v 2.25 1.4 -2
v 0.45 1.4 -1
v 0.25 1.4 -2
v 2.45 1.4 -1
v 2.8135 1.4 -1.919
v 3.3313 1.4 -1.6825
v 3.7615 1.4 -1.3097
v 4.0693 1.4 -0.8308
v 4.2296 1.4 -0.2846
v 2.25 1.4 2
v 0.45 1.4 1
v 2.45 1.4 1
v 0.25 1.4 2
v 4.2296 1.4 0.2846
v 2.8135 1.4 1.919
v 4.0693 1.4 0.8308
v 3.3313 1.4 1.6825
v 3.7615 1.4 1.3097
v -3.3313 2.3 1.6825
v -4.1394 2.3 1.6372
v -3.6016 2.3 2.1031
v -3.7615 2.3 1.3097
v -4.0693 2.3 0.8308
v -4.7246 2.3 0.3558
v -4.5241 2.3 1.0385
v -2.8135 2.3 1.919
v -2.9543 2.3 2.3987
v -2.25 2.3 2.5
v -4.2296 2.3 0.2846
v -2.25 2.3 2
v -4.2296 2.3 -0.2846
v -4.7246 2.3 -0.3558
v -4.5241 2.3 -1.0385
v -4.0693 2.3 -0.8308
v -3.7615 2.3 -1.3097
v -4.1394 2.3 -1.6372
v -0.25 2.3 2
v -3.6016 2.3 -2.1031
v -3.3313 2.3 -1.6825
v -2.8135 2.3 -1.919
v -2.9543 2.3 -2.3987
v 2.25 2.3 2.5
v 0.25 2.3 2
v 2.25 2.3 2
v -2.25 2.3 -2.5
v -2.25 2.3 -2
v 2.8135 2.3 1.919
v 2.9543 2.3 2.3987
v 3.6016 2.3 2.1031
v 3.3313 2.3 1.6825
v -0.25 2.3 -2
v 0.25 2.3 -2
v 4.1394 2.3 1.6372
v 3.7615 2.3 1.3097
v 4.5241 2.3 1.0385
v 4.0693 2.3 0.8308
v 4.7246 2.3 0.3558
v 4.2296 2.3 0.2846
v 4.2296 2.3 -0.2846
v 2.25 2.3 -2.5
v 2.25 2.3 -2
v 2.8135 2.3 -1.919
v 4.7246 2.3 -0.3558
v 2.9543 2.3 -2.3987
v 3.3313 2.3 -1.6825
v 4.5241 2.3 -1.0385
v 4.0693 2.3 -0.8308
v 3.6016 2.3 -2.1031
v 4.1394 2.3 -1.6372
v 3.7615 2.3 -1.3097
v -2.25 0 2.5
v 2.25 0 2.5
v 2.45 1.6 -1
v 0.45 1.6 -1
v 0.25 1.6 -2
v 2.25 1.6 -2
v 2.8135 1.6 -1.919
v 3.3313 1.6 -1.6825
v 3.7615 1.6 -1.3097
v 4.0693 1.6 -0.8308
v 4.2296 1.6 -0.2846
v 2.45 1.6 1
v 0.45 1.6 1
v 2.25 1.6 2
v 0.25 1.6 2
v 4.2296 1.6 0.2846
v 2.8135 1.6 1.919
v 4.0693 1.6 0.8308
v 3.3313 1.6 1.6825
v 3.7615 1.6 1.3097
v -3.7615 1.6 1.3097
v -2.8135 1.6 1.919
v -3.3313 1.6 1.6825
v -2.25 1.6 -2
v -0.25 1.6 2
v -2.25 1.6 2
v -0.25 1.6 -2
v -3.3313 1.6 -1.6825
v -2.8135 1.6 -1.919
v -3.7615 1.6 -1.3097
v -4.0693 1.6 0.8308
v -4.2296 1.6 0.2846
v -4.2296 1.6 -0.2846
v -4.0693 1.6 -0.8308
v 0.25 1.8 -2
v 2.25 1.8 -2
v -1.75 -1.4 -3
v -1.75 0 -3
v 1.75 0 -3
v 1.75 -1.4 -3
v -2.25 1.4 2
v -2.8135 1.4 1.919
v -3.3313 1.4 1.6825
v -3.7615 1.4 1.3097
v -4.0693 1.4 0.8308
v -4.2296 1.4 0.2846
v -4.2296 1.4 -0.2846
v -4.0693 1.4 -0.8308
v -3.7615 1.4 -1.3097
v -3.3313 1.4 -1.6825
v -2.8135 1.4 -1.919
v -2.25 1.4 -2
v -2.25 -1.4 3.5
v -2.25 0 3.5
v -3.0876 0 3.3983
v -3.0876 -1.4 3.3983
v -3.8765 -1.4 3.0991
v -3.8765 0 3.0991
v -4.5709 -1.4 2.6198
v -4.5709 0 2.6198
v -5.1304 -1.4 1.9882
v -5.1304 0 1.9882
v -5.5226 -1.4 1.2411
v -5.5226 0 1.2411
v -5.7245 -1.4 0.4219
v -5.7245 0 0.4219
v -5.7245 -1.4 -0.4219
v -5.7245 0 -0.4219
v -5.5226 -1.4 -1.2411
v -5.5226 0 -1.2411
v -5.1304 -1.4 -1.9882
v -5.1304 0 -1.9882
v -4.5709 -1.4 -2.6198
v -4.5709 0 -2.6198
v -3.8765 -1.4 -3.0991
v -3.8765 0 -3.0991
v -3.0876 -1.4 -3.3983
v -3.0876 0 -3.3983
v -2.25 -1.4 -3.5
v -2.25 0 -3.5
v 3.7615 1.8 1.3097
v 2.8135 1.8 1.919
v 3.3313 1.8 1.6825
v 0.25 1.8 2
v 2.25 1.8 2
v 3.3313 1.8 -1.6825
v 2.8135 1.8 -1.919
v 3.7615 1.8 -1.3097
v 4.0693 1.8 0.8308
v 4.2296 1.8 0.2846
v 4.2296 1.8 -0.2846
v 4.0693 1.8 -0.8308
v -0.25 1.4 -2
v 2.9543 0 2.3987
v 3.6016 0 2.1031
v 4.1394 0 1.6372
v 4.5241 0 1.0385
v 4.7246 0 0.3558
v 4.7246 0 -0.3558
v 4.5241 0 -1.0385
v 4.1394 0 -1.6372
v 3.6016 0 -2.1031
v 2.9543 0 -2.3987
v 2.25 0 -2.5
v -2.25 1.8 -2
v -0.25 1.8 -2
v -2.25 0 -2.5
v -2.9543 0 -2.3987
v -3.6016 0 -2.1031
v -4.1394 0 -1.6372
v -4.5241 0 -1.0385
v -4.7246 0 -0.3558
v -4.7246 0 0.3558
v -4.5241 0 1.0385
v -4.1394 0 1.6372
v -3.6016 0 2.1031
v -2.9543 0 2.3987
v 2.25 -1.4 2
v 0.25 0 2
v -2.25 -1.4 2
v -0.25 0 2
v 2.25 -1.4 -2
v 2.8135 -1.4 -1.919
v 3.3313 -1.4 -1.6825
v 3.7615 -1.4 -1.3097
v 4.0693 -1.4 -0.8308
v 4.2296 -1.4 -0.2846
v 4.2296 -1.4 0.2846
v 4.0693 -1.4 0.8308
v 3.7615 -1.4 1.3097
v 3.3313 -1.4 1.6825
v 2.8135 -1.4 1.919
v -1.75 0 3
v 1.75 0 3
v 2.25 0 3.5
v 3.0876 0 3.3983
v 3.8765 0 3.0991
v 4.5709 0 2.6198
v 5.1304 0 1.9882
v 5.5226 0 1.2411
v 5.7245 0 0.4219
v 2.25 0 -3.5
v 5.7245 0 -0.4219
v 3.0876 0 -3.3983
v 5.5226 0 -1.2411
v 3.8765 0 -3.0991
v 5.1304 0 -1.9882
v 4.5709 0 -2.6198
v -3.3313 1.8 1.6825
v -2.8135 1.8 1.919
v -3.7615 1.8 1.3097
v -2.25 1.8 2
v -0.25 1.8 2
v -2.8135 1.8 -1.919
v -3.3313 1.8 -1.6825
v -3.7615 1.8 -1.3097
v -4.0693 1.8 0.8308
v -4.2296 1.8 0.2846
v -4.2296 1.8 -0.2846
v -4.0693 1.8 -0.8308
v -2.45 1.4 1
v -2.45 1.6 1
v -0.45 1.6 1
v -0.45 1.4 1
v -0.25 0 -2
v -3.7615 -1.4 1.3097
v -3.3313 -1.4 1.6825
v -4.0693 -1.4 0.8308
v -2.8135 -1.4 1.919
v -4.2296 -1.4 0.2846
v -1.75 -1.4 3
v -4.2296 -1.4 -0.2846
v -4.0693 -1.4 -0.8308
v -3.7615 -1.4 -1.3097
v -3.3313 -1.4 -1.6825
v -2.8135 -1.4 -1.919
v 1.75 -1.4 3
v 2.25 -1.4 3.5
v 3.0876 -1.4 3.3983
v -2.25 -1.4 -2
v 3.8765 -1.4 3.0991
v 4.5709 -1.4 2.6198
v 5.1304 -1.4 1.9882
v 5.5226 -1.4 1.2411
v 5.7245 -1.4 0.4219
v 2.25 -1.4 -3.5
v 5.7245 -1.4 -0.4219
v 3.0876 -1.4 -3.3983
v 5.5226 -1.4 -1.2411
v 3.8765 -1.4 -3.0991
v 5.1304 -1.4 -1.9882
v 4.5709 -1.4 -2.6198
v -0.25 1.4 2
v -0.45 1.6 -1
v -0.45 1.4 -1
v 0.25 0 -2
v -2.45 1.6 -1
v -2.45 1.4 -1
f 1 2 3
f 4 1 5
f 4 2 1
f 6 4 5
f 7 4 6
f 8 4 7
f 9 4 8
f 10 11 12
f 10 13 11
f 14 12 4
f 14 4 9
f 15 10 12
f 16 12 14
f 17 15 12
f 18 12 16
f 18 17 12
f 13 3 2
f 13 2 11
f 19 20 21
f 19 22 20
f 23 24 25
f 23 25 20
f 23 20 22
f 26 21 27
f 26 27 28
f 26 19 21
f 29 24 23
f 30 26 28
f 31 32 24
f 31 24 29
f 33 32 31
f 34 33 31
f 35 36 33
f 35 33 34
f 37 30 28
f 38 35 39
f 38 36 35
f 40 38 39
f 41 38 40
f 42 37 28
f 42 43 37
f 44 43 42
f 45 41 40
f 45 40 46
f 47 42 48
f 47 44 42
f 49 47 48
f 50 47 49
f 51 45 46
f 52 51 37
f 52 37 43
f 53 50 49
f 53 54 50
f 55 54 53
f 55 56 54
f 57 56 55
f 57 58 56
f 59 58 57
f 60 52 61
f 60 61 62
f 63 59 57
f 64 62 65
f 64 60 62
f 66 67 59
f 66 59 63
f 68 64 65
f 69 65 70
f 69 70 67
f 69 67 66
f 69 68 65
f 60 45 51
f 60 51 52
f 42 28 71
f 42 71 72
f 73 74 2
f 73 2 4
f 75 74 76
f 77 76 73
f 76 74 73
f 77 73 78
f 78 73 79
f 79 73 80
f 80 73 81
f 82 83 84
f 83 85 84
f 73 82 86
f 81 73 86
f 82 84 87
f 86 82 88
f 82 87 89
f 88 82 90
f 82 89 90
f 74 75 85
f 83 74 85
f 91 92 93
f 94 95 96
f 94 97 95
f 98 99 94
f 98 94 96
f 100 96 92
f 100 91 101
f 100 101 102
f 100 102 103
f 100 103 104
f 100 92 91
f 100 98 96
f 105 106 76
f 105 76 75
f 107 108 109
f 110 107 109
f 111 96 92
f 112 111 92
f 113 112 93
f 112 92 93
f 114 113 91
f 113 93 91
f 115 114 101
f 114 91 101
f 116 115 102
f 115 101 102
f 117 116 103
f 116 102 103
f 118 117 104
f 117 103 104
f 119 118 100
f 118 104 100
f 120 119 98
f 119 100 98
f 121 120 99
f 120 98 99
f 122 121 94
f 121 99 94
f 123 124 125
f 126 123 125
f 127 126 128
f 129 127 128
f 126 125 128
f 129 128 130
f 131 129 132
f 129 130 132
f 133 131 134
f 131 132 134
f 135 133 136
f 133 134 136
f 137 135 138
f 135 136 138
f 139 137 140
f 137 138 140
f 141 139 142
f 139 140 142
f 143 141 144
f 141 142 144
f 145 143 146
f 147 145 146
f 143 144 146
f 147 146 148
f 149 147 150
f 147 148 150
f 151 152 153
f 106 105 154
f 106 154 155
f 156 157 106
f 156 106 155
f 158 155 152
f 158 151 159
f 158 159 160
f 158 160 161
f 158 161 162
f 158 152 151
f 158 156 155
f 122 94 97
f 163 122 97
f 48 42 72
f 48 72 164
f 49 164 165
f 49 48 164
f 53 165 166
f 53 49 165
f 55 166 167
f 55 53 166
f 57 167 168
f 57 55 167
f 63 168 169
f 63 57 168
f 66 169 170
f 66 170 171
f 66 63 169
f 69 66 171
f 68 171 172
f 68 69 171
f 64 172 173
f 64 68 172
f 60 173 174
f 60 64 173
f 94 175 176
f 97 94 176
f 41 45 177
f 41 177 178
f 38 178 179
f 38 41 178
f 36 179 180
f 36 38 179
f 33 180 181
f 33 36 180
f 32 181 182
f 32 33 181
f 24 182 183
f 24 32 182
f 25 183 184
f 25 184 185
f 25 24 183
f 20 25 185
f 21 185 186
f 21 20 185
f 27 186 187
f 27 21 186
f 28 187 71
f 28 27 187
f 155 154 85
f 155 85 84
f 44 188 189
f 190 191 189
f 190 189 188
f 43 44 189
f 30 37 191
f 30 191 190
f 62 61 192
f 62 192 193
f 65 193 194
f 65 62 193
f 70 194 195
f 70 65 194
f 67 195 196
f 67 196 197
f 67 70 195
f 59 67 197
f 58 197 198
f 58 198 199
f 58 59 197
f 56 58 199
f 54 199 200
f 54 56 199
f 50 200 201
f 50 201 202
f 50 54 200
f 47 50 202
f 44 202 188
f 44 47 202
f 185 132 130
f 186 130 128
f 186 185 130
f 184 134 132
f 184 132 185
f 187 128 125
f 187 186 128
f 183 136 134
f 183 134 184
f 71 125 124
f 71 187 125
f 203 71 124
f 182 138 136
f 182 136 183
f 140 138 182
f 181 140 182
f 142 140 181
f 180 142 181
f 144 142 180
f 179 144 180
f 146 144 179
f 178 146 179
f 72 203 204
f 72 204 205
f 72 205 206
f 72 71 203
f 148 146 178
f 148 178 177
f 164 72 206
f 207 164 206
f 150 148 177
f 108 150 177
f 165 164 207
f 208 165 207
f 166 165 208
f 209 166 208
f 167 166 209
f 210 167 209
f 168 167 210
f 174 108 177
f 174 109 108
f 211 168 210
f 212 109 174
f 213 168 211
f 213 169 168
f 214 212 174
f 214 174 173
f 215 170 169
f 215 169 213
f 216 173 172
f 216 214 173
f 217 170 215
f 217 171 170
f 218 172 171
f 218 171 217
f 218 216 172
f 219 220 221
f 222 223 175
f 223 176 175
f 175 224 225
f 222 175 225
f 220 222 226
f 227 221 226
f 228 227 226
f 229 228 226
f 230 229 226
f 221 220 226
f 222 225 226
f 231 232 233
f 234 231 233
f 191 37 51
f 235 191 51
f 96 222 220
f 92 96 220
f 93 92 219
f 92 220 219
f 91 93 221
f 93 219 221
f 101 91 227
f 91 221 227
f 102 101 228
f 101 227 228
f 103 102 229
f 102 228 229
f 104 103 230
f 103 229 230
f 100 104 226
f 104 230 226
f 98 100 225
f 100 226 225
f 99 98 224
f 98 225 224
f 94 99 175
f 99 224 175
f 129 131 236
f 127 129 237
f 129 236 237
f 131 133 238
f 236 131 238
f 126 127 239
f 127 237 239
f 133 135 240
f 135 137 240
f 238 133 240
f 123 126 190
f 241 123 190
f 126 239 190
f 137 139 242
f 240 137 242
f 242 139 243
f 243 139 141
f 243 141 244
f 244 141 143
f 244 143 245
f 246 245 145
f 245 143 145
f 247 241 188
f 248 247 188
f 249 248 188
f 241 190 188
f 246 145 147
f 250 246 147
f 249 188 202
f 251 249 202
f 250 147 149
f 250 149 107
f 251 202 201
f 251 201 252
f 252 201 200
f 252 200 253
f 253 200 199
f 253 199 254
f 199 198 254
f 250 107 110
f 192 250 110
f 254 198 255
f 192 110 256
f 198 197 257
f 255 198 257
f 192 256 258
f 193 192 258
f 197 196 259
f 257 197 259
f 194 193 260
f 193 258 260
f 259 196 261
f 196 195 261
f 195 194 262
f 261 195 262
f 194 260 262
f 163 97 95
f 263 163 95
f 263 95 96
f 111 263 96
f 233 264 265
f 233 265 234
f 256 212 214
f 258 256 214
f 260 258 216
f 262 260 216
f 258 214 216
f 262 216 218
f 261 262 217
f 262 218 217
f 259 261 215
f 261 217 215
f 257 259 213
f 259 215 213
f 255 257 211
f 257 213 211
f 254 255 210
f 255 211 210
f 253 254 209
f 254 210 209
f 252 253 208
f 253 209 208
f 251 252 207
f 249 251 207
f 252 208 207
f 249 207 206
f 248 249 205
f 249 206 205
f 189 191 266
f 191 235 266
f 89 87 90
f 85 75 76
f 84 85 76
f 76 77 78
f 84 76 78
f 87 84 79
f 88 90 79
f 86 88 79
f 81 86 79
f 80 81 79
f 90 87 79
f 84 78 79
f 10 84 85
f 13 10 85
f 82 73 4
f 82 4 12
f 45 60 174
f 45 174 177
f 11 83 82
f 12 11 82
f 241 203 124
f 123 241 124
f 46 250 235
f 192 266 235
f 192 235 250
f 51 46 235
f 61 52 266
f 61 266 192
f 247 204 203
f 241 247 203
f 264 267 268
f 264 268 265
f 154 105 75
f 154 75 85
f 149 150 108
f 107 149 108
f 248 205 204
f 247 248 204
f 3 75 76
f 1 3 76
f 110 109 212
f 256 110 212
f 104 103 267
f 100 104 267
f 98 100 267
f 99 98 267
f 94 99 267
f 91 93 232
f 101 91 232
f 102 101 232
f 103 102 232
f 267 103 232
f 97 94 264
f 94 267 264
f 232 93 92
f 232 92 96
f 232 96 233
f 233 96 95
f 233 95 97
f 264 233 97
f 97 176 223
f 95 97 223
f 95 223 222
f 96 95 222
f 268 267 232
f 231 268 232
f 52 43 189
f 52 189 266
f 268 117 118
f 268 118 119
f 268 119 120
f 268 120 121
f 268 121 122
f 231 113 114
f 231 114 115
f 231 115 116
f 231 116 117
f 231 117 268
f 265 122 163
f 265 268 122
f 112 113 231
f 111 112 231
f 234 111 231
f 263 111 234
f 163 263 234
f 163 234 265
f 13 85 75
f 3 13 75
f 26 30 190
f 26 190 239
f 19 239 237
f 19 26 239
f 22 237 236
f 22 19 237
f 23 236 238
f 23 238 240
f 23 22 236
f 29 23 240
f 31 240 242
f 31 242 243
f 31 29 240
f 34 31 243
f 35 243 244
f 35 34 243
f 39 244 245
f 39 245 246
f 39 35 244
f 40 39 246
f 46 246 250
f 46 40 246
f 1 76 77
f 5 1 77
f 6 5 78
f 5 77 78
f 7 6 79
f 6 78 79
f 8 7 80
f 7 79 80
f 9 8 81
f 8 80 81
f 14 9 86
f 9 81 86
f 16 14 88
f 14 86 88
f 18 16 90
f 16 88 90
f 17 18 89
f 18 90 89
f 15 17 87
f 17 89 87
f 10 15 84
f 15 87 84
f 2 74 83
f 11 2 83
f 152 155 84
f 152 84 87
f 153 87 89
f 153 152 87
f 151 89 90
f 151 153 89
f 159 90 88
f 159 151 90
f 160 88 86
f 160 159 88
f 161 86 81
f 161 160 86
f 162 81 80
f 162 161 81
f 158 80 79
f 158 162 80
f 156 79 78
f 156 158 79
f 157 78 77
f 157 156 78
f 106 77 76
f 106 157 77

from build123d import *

# Parameters (mm, degrees)
EXTRUDE_1_DEPTH   = 1.4
EXTRUDE_START     = 2.3
EXTRUDE_2_DEPTH   = 2.3
EXTRUDE_3_DEPTH   = 0.2
EXTRUDE_3_2_DEPTH = 0.2
SKETCH_3_W        = 2
SKETCH_3_H        = 2
EXTRUDE_4_DEPTH   = 0.2
EXTRUDE_4_2_DEPTH = 0.2


with BuildPart() as part:
    # Эскиз1 → Бобышка-Вытянуть1 (new body)
    with BuildSketch(Plane(origin=(0, 0, 0), x_dir=(1, 0, 0), z_dir=(0, 1, 0))):
        with BuildLine():
            Line((1.75, -3), (2.25, -3.5))
            ThreePointArc((2.25, -3.5), (5.75, 0), (2.25, 3.5))
            Line((2.25, 3.5), (1.75, 3))
            Line((1.75, 3), (-1.75, 3))
            Line((-1.75, 3), (-2.25, 3.5))
            ThreePointArc((-2.25, 3.5), (-5.75, 0), (-2.25, -3.5))
            Line((-2.25, -3.5), (-1.75, -3))
            Line((-1.75, -3), (1.75, -3))
        make_face()
        with BuildLine():
            Line((2.25, -2), (-2.25, -2))
            ThreePointArc((-2.25, -2), (-4.25, 0), (-2.25, 2))
            Line((-2.25, 2), (2.25, 2))
            ThreePointArc((2.25, 2), (4.25, 0), (2.25, -2))
        make_face(mode=Mode.SUBTRACT)
    extrude(amount=-EXTRUDE_1_DEPTH)

    # Эскиз1<3> → Бобышка-Вытянуть2 (add)
    with BuildSketch(Plane(origin=(0, 0, 0), x_dir=(1, 0, 0), z_dir=(0, 1, 0)).offset(EXTRUDE_START)):
        with BuildLine():
            ThreePointArc((2.25, -2.5), (4.75, 0), (2.25, 2.5))
            Line((2.25, 2.5), (-2.25, 2.5))
            ThreePointArc((-2.25, 2.5), (-4.75, 0), (-2.25, -2.5))
            Line((-2.25, -2.5), (2.25, -2.5))
        make_face()
        with BuildLine():
            Line((2.25, -2), (0.25, -2))
            Line((0.25, -2), (0.25, 2))
            Line((0.25, 2), (2.25, 2))
            ThreePointArc((2.25, 2), (4.25, 0), (2.25, -2))
        make_face(mode=Mode.SUBTRACT)
        with BuildLine():
            Line((-0.25, -2), (-2.25, -2))
            ThreePointArc((-2.25, -2), (-4.25, 0), (-2.25, 2))
            Line((-2.25, 2), (-0.25, 2))
            Line((-0.25, 2), (-0.25, -2))
        make_face(mode=Mode.SUBTRACT)
    extrude(amount=-EXTRUDE_2_DEPTH)


with BuildPart() as body_2:
    # Эскиз2 → Бобышка-Вытянуть3 (new body)
    with BuildSketch(Plane(origin=(0, 1.8, 0), x_dir=(1, 0, 0), z_dir=(0, 1, 0))):
        with BuildLine():
            Line((2.25, 2), (0.25, 2))
            Line((0.25, 2), (0.25, -2))
            Line((0.25, -2), (2.25, -2))
            ThreePointArc((2.25, -2), (4.25, 0), (2.25, 2))
        make_face()
    extrude(amount=-EXTRUDE_3_DEPTH)


with BuildPart() as body_3:
    # Эскиз2 → Extrude 3 2 (new body)
    with BuildSketch(Plane(origin=(0, 1.8, 0), x_dir=(1, 0, 0), z_dir=(0, 1, 0))):
        with BuildLine():
            Line((-0.25, -2), (-2.25, -2))
            ThreePointArc((-2.25, -2), (-4.25, 0), (-2.25, 2))
            Line((-2.25, 2), (-0.25, 2))
            Line((-0.25, 2), (-0.25, -2))
        make_face()
    extrude(amount=-EXTRUDE_3_2_DEPTH)


with BuildPart() as body_4:
    # Эскиз3 → Бобышка-Вытянуть4 (new body)
    with BuildSketch(Plane.XZ.offset(-1.6)):
        with BuildLine():
            Line((2.25, 2), (0.25, 2))
            Line((0.25, 2), (0.25, -2))
            Line((0.25, -2), (2.25, -2))
            ThreePointArc((2.25, -2), (4.25, 0), (2.25, 2))
        make_face()
        with Locations((1.45, 0)):
            Rectangle(SKETCH_3_W, SKETCH_3_H, mode=Mode.SUBTRACT)
    extrude(amount=EXTRUDE_4_DEPTH)


with BuildPart() as body_5:
    # Эскиз3 → Extrude 4 2 (new body)
    with BuildSketch(Plane.XZ.offset(-1.6)):
        with BuildLine():
            Line((-0.25, -2), (-0.25, 2))
            Line((-0.25, 2), (-2.25, 2))
            ThreePointArc((-2.25, 2), (-4.25, 0), (-2.25, -2))
            Line((-2.25, -2), (-0.25, -2))
        make_face()
        with Locations((-1.45, 0)):
            Rectangle(SKETCH_3_W, SKETCH_3_H, mode=Mode.SUBTRACT)
    extrude(amount=EXTRUDE_4_2_DEPTH)


solid = Compound([part.part, body_2.part, body_3.part, body_4.part, body_5.part])
